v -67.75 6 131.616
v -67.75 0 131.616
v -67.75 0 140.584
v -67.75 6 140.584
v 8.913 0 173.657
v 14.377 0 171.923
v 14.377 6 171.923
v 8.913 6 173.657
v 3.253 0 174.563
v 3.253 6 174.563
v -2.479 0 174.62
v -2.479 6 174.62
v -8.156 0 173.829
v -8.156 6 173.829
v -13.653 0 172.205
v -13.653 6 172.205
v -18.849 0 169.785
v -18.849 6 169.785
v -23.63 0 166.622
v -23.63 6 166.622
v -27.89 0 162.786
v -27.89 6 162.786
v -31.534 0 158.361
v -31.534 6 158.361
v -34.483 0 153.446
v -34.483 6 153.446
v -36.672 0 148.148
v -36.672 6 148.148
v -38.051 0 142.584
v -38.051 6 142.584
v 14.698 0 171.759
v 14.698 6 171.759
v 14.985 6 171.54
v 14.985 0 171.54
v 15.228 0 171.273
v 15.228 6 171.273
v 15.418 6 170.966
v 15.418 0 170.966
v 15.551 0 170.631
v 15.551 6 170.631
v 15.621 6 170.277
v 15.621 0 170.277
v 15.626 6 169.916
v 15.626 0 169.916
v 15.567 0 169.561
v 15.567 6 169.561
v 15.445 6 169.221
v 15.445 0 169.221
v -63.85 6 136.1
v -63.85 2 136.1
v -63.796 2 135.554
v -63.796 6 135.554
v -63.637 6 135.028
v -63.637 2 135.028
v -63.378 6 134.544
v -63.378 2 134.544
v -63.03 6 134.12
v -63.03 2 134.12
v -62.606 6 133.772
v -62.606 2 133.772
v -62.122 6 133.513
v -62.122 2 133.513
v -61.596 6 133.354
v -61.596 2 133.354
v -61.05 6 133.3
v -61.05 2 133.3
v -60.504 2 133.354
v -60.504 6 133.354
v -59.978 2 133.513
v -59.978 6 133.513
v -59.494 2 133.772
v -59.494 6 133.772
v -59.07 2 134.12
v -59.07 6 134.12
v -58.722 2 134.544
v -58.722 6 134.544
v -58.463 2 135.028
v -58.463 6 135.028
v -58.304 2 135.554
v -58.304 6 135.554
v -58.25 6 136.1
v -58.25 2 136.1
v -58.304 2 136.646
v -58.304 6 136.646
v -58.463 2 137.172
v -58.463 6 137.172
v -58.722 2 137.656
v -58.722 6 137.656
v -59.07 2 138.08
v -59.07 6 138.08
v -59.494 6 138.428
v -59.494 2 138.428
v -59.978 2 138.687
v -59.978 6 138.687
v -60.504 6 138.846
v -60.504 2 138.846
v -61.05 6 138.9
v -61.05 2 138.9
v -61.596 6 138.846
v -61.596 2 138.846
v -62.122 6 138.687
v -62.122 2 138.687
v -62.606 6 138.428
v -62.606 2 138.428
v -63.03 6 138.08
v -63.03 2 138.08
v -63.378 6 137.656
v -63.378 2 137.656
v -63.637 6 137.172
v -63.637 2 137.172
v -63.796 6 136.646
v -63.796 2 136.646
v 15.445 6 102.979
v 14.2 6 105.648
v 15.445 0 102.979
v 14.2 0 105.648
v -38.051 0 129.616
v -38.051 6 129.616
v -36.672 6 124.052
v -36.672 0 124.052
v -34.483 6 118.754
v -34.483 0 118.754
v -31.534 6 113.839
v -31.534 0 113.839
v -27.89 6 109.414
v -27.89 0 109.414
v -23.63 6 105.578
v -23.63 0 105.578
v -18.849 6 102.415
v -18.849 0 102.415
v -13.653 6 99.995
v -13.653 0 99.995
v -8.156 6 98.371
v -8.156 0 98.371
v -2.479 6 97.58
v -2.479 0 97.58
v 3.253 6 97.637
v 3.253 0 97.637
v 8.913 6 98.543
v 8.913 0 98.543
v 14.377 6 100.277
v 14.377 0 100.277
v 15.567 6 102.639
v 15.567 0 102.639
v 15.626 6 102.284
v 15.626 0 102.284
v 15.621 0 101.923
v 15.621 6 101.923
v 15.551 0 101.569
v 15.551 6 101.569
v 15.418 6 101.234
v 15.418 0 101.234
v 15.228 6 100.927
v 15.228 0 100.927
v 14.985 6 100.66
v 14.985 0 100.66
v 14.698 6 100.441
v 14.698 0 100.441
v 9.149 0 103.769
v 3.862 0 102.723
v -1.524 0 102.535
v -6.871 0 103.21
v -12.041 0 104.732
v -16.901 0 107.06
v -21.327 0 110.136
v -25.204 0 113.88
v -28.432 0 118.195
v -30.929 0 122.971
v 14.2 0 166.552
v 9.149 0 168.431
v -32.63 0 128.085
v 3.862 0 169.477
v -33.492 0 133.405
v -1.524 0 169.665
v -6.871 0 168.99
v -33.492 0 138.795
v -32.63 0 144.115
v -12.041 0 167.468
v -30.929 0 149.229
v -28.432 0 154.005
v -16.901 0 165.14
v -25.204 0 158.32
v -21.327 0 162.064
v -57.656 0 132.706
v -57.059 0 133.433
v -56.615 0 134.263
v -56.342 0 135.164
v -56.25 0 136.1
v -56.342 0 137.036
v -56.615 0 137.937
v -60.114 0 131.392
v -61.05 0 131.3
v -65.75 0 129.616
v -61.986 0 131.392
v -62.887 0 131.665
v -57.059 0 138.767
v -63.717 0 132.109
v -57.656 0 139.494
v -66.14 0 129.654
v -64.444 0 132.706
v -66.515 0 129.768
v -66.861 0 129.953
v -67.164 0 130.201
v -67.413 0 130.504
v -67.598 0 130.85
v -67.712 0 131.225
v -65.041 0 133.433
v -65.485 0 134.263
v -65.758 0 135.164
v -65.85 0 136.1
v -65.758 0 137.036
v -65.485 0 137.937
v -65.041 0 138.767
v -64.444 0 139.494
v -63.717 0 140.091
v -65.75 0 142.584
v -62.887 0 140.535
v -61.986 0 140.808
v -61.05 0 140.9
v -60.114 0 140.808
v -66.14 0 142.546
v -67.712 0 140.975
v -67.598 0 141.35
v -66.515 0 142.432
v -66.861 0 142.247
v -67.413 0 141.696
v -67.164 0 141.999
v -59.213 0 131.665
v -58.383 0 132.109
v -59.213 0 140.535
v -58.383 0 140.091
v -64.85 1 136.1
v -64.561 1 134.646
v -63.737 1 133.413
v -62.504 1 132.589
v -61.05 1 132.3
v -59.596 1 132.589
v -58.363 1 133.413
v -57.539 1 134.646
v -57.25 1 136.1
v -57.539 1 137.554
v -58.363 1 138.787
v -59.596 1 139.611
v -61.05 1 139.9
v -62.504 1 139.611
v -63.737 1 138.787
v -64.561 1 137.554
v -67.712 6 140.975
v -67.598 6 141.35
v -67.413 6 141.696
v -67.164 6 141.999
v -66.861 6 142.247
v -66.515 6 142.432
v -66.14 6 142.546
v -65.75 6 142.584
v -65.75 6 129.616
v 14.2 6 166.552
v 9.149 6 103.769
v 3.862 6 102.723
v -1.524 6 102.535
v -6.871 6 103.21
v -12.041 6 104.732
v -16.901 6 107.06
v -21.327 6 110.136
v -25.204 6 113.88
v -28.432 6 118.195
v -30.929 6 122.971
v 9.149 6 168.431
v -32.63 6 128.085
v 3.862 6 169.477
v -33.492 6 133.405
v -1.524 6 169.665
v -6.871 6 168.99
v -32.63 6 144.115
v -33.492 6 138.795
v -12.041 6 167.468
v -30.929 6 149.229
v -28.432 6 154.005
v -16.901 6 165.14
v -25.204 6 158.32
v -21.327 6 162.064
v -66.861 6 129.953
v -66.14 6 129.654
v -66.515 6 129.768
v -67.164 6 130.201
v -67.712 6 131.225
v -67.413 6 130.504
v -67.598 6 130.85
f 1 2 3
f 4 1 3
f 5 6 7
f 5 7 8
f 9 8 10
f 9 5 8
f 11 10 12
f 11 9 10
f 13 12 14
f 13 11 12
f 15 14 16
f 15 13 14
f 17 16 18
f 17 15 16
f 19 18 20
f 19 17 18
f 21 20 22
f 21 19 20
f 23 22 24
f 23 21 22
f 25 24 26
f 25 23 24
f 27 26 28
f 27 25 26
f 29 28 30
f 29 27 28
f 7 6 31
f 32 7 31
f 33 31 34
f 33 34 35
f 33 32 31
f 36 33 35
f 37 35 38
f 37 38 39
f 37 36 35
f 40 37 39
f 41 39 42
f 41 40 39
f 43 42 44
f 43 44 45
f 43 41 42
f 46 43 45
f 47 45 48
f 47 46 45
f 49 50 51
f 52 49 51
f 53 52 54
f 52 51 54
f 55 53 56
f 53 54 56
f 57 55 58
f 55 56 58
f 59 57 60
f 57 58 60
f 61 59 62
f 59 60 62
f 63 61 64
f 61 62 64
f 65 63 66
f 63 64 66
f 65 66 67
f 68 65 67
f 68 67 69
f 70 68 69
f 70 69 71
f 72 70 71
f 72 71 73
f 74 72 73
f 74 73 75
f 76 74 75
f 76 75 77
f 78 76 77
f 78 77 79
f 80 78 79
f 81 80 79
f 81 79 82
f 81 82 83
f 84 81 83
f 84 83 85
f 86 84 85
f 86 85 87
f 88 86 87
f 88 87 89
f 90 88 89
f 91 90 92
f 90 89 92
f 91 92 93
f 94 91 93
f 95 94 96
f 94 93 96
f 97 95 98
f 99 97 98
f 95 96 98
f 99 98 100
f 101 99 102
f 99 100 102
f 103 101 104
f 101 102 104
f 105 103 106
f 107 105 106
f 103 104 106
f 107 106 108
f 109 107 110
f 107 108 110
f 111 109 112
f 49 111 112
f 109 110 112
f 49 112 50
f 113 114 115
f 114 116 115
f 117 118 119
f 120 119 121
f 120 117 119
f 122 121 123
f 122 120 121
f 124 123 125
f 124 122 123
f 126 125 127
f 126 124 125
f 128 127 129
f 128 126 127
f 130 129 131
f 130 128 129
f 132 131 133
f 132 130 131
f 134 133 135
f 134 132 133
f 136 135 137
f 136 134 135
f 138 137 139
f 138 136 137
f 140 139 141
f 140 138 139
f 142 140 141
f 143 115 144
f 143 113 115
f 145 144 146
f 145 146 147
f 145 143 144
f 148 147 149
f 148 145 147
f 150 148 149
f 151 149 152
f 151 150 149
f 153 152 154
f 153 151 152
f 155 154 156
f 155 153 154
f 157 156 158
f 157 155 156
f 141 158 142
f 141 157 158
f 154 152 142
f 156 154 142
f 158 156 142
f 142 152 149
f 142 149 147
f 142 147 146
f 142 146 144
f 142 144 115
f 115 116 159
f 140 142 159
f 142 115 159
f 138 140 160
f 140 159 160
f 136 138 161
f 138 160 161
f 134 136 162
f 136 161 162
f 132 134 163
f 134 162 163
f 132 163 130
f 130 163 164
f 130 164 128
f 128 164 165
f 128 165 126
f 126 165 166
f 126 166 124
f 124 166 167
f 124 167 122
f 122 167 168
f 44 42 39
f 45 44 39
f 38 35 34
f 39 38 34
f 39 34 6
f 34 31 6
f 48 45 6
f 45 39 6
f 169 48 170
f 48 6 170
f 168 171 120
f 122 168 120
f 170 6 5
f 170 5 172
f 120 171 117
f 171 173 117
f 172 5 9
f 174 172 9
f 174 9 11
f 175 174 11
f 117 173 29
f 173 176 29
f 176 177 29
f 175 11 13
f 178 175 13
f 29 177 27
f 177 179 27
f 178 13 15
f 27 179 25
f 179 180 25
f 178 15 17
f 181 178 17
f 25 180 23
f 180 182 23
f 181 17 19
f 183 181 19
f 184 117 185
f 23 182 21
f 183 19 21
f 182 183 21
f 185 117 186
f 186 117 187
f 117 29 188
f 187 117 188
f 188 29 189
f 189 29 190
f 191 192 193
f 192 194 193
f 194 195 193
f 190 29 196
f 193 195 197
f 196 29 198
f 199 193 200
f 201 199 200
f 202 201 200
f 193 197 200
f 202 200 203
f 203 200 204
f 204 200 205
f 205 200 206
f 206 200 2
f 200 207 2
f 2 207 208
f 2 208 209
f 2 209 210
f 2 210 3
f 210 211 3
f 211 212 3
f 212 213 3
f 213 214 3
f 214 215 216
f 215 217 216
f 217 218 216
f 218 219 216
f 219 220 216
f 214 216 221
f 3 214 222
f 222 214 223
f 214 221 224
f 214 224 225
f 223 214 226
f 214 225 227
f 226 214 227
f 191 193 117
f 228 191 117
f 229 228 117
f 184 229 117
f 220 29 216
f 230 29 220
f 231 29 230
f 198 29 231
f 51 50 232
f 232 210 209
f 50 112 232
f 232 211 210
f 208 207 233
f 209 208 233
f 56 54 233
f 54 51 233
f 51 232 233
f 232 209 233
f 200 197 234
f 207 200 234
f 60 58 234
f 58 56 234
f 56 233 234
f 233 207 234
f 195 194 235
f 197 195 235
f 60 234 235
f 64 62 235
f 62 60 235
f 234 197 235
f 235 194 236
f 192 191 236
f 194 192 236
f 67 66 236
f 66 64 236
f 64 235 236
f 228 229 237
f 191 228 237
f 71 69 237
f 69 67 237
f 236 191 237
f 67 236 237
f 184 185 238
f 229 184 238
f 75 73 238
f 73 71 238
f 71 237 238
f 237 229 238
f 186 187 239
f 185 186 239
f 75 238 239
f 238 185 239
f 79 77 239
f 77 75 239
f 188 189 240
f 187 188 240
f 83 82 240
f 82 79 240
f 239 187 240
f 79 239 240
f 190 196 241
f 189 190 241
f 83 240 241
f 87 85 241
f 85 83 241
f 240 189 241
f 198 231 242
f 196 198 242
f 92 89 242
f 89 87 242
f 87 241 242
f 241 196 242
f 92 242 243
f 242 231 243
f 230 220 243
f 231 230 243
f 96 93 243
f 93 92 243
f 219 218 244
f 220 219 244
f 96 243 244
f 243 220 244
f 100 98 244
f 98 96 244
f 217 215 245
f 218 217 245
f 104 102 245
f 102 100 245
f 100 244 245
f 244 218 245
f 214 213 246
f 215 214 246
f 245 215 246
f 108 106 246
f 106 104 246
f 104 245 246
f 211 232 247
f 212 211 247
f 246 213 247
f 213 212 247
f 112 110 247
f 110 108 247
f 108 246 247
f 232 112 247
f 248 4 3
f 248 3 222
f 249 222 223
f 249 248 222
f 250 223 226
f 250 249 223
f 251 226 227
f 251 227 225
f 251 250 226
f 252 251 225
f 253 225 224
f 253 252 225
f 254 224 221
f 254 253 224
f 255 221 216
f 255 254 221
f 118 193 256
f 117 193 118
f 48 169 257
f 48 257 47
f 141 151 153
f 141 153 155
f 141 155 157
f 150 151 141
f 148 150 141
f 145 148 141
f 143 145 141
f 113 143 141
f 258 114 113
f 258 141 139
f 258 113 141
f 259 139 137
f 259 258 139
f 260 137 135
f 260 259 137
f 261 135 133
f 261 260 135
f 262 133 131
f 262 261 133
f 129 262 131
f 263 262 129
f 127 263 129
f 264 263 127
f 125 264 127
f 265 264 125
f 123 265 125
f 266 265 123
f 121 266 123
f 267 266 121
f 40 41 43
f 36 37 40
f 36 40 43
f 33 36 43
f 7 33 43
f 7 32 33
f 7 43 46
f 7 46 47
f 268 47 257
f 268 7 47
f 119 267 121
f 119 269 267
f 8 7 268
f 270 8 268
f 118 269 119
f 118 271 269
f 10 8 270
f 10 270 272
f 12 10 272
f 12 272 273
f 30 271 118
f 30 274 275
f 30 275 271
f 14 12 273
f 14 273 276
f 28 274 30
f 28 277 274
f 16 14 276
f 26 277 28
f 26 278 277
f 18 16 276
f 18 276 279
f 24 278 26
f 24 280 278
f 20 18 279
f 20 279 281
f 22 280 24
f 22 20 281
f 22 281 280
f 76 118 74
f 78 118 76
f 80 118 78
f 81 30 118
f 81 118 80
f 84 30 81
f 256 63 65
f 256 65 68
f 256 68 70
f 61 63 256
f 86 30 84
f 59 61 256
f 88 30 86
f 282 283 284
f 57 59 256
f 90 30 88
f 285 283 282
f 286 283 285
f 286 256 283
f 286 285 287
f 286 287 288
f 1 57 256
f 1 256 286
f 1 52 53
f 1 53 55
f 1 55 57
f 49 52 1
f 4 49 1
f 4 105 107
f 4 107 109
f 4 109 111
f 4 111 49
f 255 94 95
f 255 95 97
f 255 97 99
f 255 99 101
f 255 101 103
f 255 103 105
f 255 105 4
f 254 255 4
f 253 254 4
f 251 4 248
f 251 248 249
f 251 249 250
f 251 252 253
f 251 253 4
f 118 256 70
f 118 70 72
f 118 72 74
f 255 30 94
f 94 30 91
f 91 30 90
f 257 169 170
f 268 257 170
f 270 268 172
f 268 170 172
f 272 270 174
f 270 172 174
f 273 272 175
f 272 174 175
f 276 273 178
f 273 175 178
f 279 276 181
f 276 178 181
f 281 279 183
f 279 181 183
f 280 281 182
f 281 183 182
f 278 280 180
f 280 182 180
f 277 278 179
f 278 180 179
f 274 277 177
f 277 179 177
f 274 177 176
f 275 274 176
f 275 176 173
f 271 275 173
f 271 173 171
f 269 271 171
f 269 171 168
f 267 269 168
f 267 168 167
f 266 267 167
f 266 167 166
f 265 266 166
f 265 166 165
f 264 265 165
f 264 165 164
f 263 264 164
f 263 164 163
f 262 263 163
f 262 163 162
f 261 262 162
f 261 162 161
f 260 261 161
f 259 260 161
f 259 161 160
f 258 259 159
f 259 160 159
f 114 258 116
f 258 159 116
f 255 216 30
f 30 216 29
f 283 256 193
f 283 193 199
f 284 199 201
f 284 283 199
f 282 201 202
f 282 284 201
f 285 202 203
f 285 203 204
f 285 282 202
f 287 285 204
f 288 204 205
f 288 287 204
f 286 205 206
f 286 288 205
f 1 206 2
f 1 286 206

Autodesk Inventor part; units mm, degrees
ref_plane "YZ Plane" through (0, 0, 0) normal (1, 0, 0) x (0, 1, 0)
ref_plane "XZ Plane" through (0, 0, 0) normal (0, 1, 0) x (-1, 0, 0)
ref_plane "XY Plane" through (0, 0, 0) normal (0, 0, 1) x (1, 0, 0)
sketch "Sketch1" plane through (0, 0, 0) normal (0, 1, 0) x (-1, 0, 0)
  circle A0 centre (0, 0) radius 32.5
  line L0 (0, 32.5) -> (0, 102.5)
  line L1 (0, 102.5) -> (0, 169.7)
  circle A1 centre (0, 136.1) radius 33.6
  circle A2 centre (0, 136.1) radius 42.65
  line L2 (42.65, 136.1) -> (38.65, 136.1)
  line L3 (38.65, 136.1) -> (61.05, 136.1)
  circle A3 centre (61.05, 136.1) radius 22.4
  line L4 (61.05, 136.1) -> (61.05, 134.2)
  line L5 (61.05, 136.1) -> (61.05, 138)
  circle A4 centre (61.05, 136.1) radius 2.8
  line L6 (61.05, 138) -> (63.1067, 138)
  line L7 (61.05, 138) -> (58.9933, 138)
  line L8 (61.05, 134.2) -> (58.9933, 134.2)
  line L9 (61.05, 134.2) -> (63.1067, 134.2)
  circle A5 centre (61.05, 136.1) radius 4.7
  line L10 (0, -32.5) -> (0, -37.5)
  circle A6 centre (0, 0) radius 37.5
  line L11 (0, 32.5) -> (5, 32.5)
  line L12 (5, 32.5) -> (5, 93.7441)
  line L13 (0, 32.5) -> (-5, 32.5)
  line L14 (-5, 32.5) -> (-5, 93.7441)
  line L15 (0, 0) -> (29.257, 0) construction
  line L16 (0, 0) -> (37.5, 0) construction
  line L17 (0, 0) -> (32.476, 18.75)
  line L18 (0, 0) -> (37.5, 0) construction
  line L19 (0, 0) -> (-32.476, 18.75)
  line L20 (0, 0) -> (37.5, 0) construction
  line L21 (0, 169.7) -> (0, 174.7)
  circle A7 centre (0, 136.1) radius 38.6
  line L22 (65.75, 136.1) -> (67.75, 136.1)
  line L23 (62.4573, 140.5844) -> (62.4573, 142.5844)
  line L24 (62.4573, 131.6156) -> (62.4573, 129.6156)
  line L25 (5, 93.7441) -> (5, 102.8741)
  line L26 (-5, 93.7441) -> (-5, 102.8741)
  line L27 (62.4573, 129.6156) -> (32.9684, 129.6156)
  line L28 (62.4573, 142.5844) -> (32.9684, 142.5844)
  line L29 (62.4573, 142.5844) -> (67.75, 142.5844)
  line L30 (67.75, 142.5844) -> (67.75, 136.1)
  line L31 (67.75, 129.6156) -> (67.75, 136.1)
  line L32 (67.75, 129.6156) -> (62.4573, 129.6156)
  line L33 (0, 136.1) -> (-18.0247, 97.446)
  line L34 (0, 136.1) -> (42.65, 136.1) construction
  line L35 (0, 136.1) -> (-18.0247, 174.754)
  line L36 (0, 136.1) -> (42.65, 136.1) construction
  point P0 (37.3613, 126.4)
  point P1 (41.3134, 146.6937)
  point P2 (41.3134, 125.5063)
  point P3 (42.1542, 129.6156)
  point P4 (42.1542, 142.5844)
  point P5 (5, 97.8252)
  point P6 (38.0515, 129.6156)
  point P7 (39.6091, 129.6156)
  point P8 (39.6091, 142.5844)
  point P9 (38.0515, 142.5844)
  point P10 (-5, 97.8252)
  point P11 (-16.3131, 171.0835)
  point P12 (-14.2, 166.5519)
  point P13 (-14.2, 105.6481)
  point P14 (-16.3131, 101.1165)
  dimension "d0" = 65
  dimension "d1" = 70
  dimension "d2" = 67.2
  dimension "d3" = 85.3
  dimension "d4" = 4
  dimension "d6" = 22.4
  dimension "d7" = 1.9
  dimension "d8" = 1.9
  dimension "d9" = 5.6
  dimension "d10" = 9.4
  dimension "d11" = 5
  dimension "d12" = 5
  dimension "d13" = 5
  dimension "d16" = 30
  dimension "d17" = 150
  dimension "d18" = 5
  dimension "d19" = 2
  dimension "d20" = 2
  dimension "d21" = 2
  dimension "d28" = 115
  dimension "d29" = 115
extrude "Extrusion1" add sketch "Sketch1" along normal blind 6 contours A7 L26 A1 L0 | L0 A1 L25 A7 | A7 L33 A1 L26 | L25 A1 L27 A7 | L27 A3 L2 A2 | A2 L3 A5 L24 L27 | L27 A7 L28 A3 | L27 A1 L28 A7 | A7 L21 A1 L35 | L2 A3 L28 A2 | A2 L28 L23 A5 L3 | L24 A5 L22 L31 L32 | L21 A7 L28 A1 | A5 | L29 L30 L22 A5 L23
chamfer "Chamfer1" distance 2 angle 45 1 edges at (-58.25, 0, 136.1)
fillet "Fillet1" radius 2 4 edges at (-67.75, 3, 129.6156) (-67.75, 3, 142.5844) (16.3131, 3, 101.1165) (16.3131, 3, 171.0835)
properties part number "testing gear distances"
